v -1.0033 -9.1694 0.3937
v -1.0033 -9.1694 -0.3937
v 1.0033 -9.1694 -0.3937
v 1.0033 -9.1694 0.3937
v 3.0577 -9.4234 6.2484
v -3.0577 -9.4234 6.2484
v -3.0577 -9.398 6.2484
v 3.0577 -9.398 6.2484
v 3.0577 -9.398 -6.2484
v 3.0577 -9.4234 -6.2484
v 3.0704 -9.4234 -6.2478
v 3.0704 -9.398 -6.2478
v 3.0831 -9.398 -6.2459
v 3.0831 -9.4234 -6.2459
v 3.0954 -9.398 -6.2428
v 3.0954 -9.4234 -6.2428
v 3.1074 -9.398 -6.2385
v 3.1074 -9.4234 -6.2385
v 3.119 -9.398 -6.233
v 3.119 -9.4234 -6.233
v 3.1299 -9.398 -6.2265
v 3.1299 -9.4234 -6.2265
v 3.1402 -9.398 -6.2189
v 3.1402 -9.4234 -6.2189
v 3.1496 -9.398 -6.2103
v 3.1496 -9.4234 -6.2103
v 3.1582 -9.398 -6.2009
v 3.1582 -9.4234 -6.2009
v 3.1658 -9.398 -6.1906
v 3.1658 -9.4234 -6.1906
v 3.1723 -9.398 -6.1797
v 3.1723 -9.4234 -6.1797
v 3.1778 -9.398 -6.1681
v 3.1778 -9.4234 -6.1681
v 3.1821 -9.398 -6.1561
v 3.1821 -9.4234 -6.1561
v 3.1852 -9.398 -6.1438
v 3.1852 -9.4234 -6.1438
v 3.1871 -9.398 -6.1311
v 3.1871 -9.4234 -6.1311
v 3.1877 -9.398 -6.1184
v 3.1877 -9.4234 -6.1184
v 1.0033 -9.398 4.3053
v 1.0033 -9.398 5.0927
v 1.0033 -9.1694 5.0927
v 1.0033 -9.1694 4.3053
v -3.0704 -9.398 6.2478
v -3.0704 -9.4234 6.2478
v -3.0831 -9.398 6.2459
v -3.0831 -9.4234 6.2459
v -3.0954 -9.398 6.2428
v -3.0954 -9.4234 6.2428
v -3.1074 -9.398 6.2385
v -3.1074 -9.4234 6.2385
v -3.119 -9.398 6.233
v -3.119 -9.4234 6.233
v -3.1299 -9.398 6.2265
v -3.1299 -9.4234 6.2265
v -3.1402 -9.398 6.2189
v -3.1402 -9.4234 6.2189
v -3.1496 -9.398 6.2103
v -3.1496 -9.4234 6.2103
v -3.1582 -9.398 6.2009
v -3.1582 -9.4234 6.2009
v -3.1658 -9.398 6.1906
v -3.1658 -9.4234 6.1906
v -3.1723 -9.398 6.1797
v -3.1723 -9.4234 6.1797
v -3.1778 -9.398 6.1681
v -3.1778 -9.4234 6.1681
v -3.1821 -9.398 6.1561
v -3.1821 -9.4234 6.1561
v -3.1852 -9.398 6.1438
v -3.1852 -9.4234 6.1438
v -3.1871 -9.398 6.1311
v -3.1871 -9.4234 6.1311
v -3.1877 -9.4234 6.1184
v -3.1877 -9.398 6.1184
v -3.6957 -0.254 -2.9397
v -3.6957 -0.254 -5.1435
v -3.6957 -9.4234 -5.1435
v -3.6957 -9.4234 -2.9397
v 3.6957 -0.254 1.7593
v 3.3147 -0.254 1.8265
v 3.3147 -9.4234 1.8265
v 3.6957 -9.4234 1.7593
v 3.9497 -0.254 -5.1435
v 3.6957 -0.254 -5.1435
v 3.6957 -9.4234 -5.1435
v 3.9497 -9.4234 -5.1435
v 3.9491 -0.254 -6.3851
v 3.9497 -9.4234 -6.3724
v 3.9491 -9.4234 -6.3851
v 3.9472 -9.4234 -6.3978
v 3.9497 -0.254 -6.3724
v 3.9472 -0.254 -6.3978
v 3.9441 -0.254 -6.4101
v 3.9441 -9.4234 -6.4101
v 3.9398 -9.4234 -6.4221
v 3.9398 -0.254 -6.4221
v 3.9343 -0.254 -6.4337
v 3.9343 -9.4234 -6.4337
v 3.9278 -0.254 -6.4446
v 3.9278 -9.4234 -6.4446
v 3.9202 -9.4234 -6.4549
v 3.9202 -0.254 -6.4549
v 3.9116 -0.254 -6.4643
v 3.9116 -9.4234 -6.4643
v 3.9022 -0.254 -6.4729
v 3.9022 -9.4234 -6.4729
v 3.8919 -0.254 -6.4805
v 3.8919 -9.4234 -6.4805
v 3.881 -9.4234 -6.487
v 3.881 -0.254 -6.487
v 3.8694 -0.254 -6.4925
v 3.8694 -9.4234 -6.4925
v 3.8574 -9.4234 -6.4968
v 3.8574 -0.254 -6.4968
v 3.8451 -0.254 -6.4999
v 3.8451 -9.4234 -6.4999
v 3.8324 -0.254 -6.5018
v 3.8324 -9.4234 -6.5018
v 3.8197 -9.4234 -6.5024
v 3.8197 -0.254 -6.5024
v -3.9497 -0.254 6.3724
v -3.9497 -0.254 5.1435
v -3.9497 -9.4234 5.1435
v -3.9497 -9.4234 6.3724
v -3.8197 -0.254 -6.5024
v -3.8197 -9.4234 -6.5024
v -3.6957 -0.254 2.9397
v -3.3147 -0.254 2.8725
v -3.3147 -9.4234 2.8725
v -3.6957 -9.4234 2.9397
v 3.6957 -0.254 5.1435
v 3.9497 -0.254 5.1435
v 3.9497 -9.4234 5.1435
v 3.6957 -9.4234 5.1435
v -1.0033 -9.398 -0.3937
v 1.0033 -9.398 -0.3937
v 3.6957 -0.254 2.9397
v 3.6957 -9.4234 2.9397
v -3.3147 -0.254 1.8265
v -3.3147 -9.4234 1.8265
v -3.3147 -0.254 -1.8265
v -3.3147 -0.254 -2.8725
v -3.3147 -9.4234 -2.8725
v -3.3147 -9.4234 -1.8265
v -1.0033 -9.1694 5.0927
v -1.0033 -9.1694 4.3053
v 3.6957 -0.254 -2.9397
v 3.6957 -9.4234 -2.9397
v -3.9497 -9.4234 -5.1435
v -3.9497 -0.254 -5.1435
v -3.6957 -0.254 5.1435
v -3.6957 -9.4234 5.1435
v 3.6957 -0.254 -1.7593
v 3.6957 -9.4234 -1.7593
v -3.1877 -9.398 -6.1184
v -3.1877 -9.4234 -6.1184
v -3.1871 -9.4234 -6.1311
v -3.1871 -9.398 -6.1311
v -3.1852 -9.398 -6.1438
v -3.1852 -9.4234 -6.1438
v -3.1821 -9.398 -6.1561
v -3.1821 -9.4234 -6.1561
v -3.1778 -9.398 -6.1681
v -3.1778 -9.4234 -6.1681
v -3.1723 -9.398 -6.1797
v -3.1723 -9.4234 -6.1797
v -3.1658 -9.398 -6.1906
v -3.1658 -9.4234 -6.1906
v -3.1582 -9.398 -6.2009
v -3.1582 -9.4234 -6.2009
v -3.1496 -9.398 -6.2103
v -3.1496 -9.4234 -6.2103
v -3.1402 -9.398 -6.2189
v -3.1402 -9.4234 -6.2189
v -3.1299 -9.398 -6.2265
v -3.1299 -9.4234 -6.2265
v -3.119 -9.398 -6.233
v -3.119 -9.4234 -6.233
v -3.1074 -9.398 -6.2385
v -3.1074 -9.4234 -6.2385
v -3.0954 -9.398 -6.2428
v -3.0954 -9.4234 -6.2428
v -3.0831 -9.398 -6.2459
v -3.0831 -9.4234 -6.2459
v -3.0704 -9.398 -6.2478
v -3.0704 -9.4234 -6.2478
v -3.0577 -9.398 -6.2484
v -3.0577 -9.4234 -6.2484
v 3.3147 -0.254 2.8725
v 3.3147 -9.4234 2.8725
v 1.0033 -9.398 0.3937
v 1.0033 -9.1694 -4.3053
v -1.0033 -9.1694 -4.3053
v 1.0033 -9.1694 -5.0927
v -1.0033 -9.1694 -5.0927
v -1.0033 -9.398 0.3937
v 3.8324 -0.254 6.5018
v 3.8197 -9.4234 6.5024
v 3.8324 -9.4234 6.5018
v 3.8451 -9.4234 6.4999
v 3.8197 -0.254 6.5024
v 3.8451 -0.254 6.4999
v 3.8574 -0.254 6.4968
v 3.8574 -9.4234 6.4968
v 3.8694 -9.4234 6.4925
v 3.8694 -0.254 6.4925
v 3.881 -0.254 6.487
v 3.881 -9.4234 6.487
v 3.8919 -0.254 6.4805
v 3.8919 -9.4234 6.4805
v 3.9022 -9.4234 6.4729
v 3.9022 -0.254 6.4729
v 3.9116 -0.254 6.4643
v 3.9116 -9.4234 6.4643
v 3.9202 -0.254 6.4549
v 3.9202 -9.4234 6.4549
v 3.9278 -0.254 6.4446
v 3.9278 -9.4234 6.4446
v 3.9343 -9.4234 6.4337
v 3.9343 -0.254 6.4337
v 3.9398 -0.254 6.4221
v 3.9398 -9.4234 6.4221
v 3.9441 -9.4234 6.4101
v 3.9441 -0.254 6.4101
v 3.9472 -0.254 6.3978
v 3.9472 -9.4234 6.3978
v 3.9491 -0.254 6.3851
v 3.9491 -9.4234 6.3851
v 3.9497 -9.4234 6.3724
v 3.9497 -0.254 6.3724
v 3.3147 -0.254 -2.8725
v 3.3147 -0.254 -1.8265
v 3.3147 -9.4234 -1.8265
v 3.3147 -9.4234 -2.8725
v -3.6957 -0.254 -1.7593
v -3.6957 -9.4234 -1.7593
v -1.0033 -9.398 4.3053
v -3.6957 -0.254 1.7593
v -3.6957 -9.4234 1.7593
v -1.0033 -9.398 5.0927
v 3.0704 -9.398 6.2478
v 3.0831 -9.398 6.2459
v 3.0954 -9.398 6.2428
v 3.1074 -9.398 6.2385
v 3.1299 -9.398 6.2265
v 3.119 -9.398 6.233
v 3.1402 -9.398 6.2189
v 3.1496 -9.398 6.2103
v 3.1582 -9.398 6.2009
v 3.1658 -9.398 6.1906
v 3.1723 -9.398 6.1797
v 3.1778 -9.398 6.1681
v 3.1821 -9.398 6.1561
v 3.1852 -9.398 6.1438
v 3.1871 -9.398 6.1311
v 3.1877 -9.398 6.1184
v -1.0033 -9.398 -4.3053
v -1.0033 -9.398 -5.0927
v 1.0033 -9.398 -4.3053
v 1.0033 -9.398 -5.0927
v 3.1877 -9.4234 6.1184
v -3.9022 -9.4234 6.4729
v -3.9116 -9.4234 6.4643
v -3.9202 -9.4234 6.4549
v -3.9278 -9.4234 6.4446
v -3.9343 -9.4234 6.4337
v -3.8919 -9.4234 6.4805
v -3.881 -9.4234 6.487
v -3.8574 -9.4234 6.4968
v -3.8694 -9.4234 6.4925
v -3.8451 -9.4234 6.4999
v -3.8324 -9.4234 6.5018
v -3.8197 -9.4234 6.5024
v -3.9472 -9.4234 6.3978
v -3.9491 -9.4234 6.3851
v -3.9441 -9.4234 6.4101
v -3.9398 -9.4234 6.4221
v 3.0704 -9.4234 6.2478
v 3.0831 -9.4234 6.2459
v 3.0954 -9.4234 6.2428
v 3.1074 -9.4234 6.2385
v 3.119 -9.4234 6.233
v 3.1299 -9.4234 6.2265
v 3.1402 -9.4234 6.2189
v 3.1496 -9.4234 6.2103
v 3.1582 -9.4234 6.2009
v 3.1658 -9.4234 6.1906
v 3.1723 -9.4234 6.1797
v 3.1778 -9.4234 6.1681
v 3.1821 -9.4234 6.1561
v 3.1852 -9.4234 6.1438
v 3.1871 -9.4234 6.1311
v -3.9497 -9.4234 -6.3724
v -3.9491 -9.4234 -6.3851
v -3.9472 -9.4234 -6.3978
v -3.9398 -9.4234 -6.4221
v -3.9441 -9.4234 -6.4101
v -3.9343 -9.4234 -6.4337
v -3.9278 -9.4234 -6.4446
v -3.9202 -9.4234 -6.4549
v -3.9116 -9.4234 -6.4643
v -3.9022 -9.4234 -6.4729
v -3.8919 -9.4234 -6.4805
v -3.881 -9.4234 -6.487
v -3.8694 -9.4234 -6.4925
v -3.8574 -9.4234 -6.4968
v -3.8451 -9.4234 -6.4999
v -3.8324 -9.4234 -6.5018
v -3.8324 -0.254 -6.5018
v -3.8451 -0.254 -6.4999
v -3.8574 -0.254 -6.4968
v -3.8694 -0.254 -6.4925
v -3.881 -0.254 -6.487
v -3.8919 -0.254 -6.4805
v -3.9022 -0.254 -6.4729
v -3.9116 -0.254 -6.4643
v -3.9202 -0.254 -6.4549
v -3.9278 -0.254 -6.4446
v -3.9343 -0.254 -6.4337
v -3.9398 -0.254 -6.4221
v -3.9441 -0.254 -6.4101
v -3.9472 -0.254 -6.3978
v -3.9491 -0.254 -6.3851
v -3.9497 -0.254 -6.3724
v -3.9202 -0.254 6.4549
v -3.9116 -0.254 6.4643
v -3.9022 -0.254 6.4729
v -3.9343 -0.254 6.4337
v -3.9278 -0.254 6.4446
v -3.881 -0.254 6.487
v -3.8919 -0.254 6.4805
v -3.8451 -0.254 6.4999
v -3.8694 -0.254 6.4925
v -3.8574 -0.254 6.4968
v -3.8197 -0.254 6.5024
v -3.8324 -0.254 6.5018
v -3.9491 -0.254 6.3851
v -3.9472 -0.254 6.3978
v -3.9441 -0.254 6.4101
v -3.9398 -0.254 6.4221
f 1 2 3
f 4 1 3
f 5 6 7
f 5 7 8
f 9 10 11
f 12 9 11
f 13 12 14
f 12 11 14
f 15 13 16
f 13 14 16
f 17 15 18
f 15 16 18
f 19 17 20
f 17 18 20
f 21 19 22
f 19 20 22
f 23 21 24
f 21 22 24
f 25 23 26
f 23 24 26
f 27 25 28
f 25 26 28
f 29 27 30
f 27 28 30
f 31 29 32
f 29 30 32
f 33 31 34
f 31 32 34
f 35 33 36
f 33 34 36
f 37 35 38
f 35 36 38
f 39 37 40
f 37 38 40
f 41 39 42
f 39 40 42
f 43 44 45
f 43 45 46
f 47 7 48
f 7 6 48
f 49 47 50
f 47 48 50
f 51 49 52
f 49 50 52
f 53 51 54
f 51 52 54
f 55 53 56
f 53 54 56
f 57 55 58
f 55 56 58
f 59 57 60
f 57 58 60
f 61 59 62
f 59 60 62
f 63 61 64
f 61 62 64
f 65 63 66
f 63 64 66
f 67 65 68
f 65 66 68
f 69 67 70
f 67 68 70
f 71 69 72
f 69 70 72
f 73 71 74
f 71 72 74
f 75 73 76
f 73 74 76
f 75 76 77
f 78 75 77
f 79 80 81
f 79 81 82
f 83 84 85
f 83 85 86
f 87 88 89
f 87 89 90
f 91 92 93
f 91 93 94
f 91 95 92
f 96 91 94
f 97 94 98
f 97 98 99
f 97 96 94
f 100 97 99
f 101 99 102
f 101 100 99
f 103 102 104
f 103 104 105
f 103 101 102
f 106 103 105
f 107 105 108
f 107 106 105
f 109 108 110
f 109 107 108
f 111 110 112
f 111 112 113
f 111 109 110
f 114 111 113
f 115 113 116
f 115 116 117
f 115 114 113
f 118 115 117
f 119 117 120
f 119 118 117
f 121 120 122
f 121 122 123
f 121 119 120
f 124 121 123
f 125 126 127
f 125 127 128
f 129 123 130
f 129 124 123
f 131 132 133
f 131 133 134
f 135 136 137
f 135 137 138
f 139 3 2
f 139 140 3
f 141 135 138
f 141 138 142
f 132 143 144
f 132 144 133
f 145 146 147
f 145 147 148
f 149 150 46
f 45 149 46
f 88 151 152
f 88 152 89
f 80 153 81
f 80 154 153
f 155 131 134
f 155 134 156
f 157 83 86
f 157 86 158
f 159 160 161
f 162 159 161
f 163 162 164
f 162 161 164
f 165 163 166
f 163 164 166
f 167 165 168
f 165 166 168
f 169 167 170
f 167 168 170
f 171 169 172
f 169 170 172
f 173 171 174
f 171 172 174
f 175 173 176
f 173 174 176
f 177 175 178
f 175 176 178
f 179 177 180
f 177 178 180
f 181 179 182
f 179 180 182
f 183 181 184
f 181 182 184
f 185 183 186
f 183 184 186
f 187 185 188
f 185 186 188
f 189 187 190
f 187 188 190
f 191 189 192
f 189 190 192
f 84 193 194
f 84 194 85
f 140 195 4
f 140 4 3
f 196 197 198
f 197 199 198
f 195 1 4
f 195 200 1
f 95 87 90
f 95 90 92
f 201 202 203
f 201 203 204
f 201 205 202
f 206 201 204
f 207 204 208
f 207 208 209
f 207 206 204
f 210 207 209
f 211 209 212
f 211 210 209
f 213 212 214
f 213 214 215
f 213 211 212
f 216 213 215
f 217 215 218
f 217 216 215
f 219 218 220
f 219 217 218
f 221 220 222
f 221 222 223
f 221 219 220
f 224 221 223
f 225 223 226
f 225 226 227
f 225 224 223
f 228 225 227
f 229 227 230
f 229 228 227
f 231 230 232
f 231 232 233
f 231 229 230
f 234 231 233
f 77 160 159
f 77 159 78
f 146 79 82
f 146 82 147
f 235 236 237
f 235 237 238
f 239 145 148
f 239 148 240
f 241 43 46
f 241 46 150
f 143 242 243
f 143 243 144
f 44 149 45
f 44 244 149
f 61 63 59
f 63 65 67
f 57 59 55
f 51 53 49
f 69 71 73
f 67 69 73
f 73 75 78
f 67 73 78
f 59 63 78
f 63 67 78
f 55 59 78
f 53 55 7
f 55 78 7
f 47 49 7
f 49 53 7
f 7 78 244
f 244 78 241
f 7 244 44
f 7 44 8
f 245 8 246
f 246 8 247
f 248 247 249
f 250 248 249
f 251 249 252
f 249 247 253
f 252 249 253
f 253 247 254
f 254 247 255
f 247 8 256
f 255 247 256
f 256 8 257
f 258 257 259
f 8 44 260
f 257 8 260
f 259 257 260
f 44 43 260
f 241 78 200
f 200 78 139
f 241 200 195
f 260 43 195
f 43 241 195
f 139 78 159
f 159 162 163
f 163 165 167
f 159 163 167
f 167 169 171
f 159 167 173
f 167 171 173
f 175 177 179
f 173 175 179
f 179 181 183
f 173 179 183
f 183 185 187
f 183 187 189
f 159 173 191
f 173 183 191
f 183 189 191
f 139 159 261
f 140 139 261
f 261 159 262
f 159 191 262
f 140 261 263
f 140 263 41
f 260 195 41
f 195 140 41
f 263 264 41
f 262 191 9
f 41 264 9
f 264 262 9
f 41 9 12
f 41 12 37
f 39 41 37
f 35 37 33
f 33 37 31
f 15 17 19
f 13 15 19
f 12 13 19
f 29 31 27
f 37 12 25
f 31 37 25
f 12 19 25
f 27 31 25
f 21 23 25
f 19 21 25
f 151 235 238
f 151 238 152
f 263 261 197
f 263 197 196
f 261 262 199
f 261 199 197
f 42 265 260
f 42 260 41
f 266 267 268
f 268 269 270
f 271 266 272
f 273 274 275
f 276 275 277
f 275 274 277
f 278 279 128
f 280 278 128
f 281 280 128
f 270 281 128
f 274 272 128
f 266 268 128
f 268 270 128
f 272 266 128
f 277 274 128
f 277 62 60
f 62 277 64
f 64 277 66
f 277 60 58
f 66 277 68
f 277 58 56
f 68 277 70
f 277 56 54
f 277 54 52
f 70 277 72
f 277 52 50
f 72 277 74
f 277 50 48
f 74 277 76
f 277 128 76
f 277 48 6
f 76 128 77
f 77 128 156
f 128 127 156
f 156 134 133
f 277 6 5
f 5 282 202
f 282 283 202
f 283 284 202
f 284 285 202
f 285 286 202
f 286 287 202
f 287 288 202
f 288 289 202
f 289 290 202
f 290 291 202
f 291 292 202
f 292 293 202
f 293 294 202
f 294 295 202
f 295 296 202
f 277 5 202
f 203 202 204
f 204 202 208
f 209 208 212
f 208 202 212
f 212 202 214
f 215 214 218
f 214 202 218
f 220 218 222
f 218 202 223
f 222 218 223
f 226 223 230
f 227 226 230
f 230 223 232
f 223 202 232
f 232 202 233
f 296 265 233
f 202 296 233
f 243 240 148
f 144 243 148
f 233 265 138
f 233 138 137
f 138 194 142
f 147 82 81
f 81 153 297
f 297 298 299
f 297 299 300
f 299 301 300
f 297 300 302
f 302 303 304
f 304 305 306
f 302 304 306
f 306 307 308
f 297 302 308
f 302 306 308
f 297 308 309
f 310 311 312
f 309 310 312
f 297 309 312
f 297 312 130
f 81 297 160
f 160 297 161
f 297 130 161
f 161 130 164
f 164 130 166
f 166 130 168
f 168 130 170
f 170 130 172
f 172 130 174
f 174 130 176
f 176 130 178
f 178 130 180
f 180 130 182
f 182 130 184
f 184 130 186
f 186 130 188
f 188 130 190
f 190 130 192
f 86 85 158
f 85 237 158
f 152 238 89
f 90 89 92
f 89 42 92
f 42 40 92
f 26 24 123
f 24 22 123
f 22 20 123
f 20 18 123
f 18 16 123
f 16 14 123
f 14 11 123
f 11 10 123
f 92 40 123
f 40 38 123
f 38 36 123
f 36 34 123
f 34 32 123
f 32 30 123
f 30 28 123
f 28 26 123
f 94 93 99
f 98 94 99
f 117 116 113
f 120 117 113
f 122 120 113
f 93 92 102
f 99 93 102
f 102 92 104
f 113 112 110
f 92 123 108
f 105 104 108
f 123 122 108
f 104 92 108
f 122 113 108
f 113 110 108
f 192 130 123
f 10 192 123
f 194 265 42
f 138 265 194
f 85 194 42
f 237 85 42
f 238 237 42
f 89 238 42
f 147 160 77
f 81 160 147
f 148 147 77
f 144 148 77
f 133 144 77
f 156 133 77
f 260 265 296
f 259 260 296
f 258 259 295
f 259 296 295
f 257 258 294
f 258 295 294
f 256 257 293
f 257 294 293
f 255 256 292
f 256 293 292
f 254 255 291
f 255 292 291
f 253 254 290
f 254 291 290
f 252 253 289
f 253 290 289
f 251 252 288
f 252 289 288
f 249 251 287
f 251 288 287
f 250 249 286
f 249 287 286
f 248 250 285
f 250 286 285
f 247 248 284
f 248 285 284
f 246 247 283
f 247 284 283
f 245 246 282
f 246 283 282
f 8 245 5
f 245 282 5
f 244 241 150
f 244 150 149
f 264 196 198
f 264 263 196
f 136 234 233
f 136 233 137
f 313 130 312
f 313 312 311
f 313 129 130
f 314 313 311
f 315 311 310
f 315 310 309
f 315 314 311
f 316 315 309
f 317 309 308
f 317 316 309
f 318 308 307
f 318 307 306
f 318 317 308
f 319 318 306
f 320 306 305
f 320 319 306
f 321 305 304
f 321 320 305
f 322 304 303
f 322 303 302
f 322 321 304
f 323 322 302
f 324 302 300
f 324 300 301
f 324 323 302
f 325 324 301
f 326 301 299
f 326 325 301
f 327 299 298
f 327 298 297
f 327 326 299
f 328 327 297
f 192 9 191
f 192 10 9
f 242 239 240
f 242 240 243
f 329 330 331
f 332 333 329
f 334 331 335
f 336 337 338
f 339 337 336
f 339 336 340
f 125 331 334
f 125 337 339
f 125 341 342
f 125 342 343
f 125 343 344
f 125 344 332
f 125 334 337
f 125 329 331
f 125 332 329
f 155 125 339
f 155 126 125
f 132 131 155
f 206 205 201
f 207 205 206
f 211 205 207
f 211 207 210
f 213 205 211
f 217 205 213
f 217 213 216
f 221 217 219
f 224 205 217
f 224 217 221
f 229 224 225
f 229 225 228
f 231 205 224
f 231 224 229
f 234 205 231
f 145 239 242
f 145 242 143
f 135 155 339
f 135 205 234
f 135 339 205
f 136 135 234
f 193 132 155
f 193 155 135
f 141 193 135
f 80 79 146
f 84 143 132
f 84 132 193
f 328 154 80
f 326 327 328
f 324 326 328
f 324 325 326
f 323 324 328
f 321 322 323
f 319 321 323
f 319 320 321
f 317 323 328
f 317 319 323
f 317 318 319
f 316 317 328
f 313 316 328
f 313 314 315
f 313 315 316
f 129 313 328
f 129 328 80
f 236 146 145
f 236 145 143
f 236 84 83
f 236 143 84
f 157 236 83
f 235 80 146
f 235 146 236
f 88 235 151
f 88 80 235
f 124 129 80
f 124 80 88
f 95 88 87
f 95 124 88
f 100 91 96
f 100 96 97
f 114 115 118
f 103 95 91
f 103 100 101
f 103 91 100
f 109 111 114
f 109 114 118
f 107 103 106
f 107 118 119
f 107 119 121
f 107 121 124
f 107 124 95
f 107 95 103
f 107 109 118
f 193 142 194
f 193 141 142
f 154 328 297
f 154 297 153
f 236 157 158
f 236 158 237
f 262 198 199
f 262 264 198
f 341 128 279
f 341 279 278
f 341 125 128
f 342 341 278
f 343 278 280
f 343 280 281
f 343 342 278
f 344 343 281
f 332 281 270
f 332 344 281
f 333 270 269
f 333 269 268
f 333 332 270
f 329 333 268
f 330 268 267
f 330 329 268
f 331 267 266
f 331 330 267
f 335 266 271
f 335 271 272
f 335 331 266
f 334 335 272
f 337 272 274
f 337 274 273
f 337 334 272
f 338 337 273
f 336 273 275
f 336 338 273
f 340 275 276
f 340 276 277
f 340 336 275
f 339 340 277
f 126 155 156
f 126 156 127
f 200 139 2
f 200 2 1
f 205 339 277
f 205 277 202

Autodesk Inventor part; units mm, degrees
sketch "Sketch_2" plane through (0, -0.254, 0) normal (0, 1, 0) x (1, 0, 0)
  line L0 (-3.9497, -5.1435) -> (-3.9497, -6.3724)
  arc A0 (-3.9497, -6.3724) -> (-3.8197, -6.5024) centre (-3.8197, -6.3724) ccw
  line L1 (-3.8197, -6.5024) -> (3.8197, -6.5024)
  arc A1 (3.8197, -6.5024) -> (3.9497, -6.3724) centre (3.8197, -6.3724) ccw
  line L2 (3.9497, -6.3724) -> (3.9497, -5.1435)
  line L3 (3.9497, -5.1435) -> (3.6957, -5.1435)
  line L4 (3.6957, -5.1435) -> (3.6957, -2.9397)
  line L5 (3.6957, -2.9397) -> (3.3147, -2.8725)
  line L6 (3.3147, -2.8725) -> (3.3147, -1.8265)
  line L7 (3.3147, -1.8265) -> (3.6957, -1.7593)
  line L8 (3.6957, -1.7593) -> (3.6957, 1.7593)
  line L9 (3.6957, 1.7593) -> (3.3147, 1.8265)
  line L10 (3.3147, 1.8265) -> (3.3147, 2.8725)
  line L11 (3.3147, 2.8725) -> (3.6957, 2.9397)
  line L12 (3.6957, 2.9397) -> (3.6957, 5.1435)
  line L13 (3.6957, 5.1435) -> (3.9497, 5.1435)
  line L14 (3.9497, 5.1435) -> (3.9497, 6.3724)
  arc A2 (3.9497, 6.3724) -> (3.8197, 6.5024) centre (3.8197, 6.3724) ccw
  line L15 (3.8197, 6.5024) -> (-3.8197, 6.5024)
  arc A3 (-3.8197, 6.5024) -> (-3.9497, 6.3724) centre (-3.8197, 6.3724) ccw
  line L16 (-3.9497, 6.3724) -> (-3.9497, 5.1435)
  line L17 (-3.9497, 5.1435) -> (-3.6957, 5.1435)
  line L18 (-3.6957, 5.1435) -> (-3.6957, 2.9397)
  line L19 (-3.6957, 2.9397) -> (-3.3147, 2.8725)
  line L20 (-3.3147, 2.8725) -> (-3.3147, 1.8265)
  line L21 (-3.3147, 1.8265) -> (-3.6957, 1.7593)
  line L22 (-3.6957, 1.7593) -> (-3.6957, -1.7593)
  line L23 (-3.6957, -1.7593) -> (-3.3147, -1.8265)
  line L24 (-3.3147, -1.8265) -> (-3.3147, -2.8725)
  line L25 (-3.3147, -2.8725) -> (-3.6957, -2.9397)
  line L26 (-3.6957, -2.9397) -> (-3.6957, -5.1435)
  line L27 (-3.6957, -5.1435) -> (-3.9497, -5.1435)
extrude "Extrusion1" add sketch "Sketch_2" against normal blind 9.1694
sketch "Sketch_1" plane through (0, -9.4234, 0) normal (0, 1, 0) x (1, 0, 0)
  line L0 (-3.1877, 6.1184) -> (-3.1877, -6.1184)
  arc A0 (-3.1877, -6.1184) -> (-3.0577, -6.2484) centre (-3.0577, -6.1184) ccw
  line L1 (-3.0577, -6.2484) -> (3.0577, -6.2484)
  arc A1 (3.0577, -6.2484) -> (3.1877, -6.1184) centre (3.0577, -6.1184) ccw
  line L2 (3.1877, -6.1184) -> (3.1877, 6.1184)
  arc A2 (3.1877, 6.1184) -> (3.0577, 6.2484) centre (3.0577, 6.1184) ccw
  line L3 (3.0577, 6.2484) -> (-3.0577, 6.2484)
  arc A3 (-3.0577, 6.2484) -> (-3.1877, 6.1184) centre (-3.0577, 6.1184) ccw
extrude "Extrusion2" cut sketch "Sketch_1" along normal blind 0.0254
sketch "Sketch_7" plane through (0, -9.4234, 0) normal (0, 1, 0) x (1, 0, 0)
  line L0 (-1.0033, 5.0927) -> (-1.0033, 4.3053)
  line L1 (-1.0033, 4.3053) -> (1.0033, 4.3053)
  line L2 (1.0033, 4.3053) -> (1.0033, 5.0927)
  line L3 (1.0033, 5.0927) -> (-1.0033, 5.0927)
extrude "Extrusion3" cut sketch "Sketch_7" along normal blind 0.254
pattern_linear "Rectangular Pattern1" count 3 spacing 4.699 along (0, 0, 1) of "Extrusion3"
ref_plane "rot_XY" through (0, 6.6675, 0) normal (1, 0, 0) x (0, 0, -1)
ref_plane "rot_YZ" through (0, 6.6675, 0) normal (0, 0, -1) x (0, 1, 0)
ref_plane "rot_ZX" through (0, 6.6675, 0) normal (0, 1, 0) x (1, 0, 0)
ref_plane "to_cover_XY" through (0, -0.254, 0) normal (0, 1, 0) x (1, 0, 0)
ref_plane "to_cover_YZ" through (0, -0.254, 0) normal (1, 0, 0) x (0, 0, -1)
ref_plane "to_cover_ZX" through (0, -0.254, 0) normal (0, 0, -1) x (0, 1, 0)
ref_plane "to_terminals_XY" through (0, -9.4234, 0) normal (0, 1, 0) x (1, 0, 0)
ref_plane "to_terminals_YZ" through (0, -9.4234, 0) normal (1, 0, 0) x (0, 0, -1)
ref_plane "to_terminals_ZX" through (0, -9.4234, 0) normal (0, 0, -1) x (0, 1, 0)
properties part number "M20191SS1W01-switch"
